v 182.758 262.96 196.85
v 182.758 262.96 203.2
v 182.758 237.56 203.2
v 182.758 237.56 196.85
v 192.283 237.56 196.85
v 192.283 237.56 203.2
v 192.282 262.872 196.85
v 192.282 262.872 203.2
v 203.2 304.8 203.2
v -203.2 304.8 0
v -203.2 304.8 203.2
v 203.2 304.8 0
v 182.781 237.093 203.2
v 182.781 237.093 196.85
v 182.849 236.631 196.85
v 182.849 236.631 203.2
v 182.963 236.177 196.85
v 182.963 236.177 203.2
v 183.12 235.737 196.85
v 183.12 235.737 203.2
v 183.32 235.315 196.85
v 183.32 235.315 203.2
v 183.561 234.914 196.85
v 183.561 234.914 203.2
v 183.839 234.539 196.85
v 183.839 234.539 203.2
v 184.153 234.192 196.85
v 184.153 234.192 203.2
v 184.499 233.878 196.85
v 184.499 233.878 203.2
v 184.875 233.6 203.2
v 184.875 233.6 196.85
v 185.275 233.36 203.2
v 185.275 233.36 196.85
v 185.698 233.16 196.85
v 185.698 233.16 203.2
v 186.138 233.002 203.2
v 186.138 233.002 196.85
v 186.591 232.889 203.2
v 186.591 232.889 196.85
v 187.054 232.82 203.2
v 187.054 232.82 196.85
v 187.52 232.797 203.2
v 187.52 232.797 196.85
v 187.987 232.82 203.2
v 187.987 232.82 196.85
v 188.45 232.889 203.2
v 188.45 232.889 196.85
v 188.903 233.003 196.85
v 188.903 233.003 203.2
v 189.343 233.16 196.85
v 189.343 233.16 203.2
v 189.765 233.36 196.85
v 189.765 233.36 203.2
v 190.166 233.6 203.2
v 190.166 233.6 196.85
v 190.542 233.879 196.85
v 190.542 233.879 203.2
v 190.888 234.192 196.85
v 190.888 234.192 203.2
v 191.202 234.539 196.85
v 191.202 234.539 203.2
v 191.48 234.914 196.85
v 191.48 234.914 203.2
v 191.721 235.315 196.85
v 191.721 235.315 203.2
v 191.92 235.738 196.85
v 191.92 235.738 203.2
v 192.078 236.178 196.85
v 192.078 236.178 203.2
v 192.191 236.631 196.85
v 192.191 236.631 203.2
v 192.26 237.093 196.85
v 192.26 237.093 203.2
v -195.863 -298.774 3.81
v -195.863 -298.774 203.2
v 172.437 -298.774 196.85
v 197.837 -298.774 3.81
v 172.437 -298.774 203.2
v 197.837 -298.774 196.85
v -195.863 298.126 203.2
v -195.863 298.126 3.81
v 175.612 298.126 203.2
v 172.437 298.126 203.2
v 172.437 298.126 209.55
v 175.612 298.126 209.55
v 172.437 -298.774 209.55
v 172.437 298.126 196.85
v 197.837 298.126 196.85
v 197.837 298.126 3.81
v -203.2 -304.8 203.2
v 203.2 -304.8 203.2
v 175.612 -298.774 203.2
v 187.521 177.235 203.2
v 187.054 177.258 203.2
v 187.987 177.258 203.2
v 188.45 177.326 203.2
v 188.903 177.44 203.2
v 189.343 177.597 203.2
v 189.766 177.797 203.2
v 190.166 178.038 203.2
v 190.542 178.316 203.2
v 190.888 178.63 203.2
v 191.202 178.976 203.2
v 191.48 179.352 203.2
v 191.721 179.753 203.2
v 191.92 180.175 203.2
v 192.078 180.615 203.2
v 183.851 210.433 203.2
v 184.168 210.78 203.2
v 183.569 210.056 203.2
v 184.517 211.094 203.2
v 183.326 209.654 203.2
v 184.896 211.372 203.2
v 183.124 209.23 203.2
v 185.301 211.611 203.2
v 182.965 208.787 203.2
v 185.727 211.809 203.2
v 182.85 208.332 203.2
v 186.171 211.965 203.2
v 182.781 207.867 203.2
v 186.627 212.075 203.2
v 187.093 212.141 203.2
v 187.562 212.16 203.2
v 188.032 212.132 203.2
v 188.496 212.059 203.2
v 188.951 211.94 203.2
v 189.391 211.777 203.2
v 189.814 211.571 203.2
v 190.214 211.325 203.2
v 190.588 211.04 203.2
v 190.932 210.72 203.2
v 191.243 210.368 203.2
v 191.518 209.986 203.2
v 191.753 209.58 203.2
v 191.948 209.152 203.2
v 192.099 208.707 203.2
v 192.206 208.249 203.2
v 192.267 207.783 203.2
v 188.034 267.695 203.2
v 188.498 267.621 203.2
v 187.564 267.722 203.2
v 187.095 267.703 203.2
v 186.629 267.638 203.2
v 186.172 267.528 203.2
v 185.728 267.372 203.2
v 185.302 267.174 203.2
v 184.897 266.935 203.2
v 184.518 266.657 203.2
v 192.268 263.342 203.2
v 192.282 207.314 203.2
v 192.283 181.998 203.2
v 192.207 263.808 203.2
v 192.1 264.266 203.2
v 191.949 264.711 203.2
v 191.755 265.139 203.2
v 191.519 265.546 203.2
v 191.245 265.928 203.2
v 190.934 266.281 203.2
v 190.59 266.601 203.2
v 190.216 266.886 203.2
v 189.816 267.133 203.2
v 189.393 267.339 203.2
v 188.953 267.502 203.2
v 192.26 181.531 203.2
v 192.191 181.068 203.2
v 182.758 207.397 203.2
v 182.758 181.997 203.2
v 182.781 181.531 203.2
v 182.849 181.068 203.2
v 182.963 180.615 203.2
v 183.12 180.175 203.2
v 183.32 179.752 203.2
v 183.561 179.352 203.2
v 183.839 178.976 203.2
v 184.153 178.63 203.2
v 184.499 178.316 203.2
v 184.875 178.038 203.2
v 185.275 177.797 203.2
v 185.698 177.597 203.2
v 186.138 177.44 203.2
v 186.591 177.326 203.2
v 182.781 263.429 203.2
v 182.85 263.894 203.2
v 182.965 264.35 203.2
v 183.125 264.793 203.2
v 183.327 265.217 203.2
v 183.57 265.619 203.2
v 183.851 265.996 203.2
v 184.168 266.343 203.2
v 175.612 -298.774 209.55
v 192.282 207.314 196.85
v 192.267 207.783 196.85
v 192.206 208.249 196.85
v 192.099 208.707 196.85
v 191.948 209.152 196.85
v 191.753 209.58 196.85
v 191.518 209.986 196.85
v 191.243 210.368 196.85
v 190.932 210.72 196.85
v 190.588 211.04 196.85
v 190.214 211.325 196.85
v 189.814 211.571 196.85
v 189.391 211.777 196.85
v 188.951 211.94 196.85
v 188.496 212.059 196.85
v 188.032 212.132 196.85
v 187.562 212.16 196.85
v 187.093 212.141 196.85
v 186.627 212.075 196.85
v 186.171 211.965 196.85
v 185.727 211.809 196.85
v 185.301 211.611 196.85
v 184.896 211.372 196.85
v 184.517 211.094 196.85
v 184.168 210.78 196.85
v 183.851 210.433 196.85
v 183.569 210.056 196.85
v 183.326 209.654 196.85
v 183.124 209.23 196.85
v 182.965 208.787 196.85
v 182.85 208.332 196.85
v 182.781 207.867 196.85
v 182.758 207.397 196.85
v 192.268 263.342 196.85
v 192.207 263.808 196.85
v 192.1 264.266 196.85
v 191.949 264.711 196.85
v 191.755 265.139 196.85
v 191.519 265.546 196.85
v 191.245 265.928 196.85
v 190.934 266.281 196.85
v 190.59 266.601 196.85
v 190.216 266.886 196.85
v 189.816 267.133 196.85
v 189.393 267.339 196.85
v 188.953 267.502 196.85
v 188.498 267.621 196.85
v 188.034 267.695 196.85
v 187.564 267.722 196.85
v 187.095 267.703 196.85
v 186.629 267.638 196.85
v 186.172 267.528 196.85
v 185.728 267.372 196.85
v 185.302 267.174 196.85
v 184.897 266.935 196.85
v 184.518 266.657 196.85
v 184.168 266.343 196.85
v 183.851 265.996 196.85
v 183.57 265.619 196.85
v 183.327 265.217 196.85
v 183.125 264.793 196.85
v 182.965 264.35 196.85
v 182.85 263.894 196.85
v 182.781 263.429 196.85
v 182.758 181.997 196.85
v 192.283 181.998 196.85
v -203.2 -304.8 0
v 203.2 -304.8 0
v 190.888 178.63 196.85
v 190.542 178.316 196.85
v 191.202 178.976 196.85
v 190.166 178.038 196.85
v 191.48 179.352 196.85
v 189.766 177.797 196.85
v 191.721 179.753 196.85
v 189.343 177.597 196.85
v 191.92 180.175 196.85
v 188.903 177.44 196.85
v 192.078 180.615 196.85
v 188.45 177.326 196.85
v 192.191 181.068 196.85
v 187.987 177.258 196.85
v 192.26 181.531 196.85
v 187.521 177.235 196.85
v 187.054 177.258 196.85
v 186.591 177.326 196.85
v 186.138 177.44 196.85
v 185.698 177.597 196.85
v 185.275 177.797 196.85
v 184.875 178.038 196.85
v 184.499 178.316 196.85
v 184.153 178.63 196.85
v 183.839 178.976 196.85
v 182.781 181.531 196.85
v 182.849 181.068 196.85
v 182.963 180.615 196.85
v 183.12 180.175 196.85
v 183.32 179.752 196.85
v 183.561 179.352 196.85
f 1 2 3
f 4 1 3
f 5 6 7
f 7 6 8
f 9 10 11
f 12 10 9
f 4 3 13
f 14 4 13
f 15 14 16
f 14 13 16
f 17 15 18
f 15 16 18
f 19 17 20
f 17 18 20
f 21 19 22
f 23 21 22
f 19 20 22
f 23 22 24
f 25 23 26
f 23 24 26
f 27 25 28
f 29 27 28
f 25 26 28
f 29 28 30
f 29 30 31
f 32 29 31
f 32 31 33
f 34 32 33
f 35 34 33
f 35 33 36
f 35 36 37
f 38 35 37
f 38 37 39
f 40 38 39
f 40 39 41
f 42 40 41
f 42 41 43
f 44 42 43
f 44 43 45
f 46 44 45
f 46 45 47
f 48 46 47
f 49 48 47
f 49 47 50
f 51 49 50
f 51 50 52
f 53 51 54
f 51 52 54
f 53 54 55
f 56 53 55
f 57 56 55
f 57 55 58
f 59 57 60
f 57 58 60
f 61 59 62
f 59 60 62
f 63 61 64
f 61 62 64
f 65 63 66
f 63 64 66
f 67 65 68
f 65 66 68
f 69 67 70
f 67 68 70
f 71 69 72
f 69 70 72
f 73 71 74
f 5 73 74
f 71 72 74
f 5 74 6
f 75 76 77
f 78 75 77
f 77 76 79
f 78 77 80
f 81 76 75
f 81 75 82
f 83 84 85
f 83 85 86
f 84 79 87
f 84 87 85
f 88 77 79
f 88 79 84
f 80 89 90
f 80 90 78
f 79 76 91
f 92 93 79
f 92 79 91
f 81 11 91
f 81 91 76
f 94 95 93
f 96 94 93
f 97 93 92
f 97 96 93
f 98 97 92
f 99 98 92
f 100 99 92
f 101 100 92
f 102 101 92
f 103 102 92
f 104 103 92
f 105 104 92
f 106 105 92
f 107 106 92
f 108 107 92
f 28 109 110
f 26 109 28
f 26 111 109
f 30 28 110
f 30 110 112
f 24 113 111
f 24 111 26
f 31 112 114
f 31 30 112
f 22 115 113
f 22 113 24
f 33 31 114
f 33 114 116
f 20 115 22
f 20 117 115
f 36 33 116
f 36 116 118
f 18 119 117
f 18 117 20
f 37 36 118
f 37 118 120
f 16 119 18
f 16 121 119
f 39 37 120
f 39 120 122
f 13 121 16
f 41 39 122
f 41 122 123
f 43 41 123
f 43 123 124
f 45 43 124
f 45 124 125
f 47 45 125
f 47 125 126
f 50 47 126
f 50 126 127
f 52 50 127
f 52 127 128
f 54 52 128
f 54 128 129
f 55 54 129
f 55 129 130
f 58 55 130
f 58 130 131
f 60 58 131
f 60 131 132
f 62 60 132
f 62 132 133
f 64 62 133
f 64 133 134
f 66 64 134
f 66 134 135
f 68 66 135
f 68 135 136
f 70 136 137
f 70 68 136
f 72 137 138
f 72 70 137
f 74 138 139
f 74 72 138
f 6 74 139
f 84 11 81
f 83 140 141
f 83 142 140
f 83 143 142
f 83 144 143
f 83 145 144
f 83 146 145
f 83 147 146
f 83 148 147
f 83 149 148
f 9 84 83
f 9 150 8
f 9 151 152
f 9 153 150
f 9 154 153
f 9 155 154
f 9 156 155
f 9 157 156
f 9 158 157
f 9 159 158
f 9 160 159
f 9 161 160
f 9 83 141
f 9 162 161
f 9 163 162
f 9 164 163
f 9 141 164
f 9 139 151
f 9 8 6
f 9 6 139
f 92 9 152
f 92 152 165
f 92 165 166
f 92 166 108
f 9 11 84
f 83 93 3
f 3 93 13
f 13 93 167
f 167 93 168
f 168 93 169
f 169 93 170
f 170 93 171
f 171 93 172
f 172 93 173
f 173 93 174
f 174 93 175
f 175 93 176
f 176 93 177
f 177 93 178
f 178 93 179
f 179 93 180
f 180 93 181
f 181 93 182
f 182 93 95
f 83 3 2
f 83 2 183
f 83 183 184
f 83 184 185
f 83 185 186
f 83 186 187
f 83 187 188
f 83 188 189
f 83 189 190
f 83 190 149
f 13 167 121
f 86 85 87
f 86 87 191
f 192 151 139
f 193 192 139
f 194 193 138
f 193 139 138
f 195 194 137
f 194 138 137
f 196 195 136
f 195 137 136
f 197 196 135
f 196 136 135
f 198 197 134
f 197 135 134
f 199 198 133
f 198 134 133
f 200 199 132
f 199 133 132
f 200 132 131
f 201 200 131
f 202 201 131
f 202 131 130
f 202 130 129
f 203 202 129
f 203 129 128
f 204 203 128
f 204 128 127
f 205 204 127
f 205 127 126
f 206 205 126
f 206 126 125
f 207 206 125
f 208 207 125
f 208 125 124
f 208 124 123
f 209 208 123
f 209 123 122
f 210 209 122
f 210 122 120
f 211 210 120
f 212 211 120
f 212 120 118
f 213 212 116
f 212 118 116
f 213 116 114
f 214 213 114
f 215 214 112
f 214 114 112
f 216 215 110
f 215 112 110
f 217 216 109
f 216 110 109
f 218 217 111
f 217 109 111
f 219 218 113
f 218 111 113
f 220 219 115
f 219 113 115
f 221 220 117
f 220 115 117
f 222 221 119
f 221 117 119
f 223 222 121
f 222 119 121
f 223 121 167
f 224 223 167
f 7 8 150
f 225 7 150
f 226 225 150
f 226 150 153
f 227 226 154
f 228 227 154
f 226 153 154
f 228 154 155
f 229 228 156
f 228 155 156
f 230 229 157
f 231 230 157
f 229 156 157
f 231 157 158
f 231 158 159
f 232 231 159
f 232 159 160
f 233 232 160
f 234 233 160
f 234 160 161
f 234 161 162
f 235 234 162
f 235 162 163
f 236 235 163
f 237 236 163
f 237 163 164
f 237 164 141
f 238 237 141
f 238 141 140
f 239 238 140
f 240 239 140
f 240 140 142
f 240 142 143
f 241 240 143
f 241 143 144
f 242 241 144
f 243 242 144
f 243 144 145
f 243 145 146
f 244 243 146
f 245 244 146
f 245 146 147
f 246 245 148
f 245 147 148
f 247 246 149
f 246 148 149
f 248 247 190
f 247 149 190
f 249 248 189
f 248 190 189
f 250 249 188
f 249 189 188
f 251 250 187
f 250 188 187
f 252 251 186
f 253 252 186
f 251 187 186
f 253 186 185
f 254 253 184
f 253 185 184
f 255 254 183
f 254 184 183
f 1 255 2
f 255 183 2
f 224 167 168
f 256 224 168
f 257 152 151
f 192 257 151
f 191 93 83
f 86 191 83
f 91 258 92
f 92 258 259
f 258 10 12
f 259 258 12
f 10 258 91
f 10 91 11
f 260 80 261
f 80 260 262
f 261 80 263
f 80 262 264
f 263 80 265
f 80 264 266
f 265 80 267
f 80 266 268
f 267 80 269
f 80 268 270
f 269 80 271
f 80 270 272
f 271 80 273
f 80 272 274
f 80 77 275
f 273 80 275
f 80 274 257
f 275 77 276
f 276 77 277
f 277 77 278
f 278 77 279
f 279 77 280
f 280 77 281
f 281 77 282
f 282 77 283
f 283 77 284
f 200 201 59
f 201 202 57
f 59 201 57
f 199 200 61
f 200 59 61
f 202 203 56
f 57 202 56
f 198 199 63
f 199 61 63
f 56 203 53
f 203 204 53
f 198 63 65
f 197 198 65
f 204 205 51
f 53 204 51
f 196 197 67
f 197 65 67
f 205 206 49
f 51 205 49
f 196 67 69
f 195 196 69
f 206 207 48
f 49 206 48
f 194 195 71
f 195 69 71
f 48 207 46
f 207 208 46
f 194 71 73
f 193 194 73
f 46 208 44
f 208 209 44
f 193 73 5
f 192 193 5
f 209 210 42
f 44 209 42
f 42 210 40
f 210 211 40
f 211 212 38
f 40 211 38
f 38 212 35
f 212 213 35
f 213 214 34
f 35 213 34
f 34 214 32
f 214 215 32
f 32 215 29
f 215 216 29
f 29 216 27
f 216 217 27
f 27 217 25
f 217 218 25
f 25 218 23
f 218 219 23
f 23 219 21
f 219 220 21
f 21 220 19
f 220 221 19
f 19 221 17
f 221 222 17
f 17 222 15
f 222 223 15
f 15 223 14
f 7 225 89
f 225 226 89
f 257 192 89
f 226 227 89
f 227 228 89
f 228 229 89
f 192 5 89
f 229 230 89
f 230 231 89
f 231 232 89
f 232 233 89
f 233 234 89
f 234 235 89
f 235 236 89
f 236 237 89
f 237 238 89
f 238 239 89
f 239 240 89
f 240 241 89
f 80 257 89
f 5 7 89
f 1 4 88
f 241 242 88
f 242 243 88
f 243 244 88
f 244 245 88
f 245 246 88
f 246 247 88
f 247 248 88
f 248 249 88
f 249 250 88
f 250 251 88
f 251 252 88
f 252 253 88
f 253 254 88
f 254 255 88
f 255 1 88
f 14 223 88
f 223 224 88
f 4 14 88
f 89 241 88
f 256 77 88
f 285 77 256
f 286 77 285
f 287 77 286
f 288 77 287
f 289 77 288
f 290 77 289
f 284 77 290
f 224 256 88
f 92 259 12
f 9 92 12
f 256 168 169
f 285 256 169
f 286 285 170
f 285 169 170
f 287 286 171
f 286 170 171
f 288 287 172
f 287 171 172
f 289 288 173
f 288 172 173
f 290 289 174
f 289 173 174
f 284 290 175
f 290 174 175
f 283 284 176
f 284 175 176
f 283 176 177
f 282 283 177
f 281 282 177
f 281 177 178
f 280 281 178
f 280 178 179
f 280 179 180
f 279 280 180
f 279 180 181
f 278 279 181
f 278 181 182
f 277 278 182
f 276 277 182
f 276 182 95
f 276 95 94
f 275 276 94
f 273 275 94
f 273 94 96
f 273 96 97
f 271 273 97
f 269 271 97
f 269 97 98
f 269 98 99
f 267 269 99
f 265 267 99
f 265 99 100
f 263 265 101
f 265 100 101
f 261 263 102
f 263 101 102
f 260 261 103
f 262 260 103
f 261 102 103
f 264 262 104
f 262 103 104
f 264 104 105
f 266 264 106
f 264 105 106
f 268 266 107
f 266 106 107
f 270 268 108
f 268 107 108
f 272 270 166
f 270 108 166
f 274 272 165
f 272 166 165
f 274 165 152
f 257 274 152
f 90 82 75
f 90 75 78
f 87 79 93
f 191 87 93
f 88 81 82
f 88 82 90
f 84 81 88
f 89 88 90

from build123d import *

# Parameters (mm, degrees)
F0_W     = 406.4
F0_H     = 609.6
F1_DEPTH = 203.2
F2_W     = 368.3
F2_H     = 596.9
F3_DEPTH = 199.39
F5_DEPTH = 25.4
F7_DEPTH = 25.4
F8_W     = 3.175
F8_H     = 596.9
F9_DEPTH = 6.35


with BuildPart() as f1:
    # F0 (on Top) → F1 (new body)
    with BuildSketch(Plane.XY):
        Rectangle(F0_W, F0_H)
    extrude(amount=F1_DEPTH)

    # F2 (on face) → F3 (cut)
    with BuildSketch(Plane.XY.offset(203.2)):
        with Locations((-11.712919, -0.323749)):
            Rectangle(F2_W, F2_H)
    extrude(amount=-F3_DEPTH, mode=Mode.SUBTRACT)

    # F4 (on face) → F5 (cut)
    with BuildSketch(Plane(origin=(172.437081, 0, 0), x_dir=(0, -1, 0), z_dir=(-1, 0, 0))):
        Polygon((-298.126251, 196.85), (-298.126251, 3.81), (298.773749, 3.81), (298.773749, 196.85), (-77.169992, 196.85), align=None)
    extrude(amount=-F5_DEPTH, mode=Mode.SUBTRACT)

    # F6 (on face) → F7 (cut)
    with BuildSketch(Plane.XY.offset(203.2)):
        with BuildLine():
            Line((192.28287, 237.560081), (192.282062, 262.872214))
            ThreePointArc((192.282062, 262.872214), (187.564229, 267.722228), (182.75787, 262.959929))
            Line((182.75787, 262.959929), (182.75787, 237.559929))
            ThreePointArc((182.75787, 237.559929), (187.520446, 232.797429), (192.28287, 237.560081))
        make_face()
        with BuildLine():
            Line((192.282946, 181.997568), (192.282208, 207.31357))
            ThreePointArc((192.282208, 207.31357), (187.562377, 212.159745), (182.757946, 207.397429))
            Line((182.757946, 207.397429), (182.757946, 181.997429))
            ThreePointArc((182.757946, 181.997429), (187.520515, 177.234929), (192.282946, 181.997568))
        make_face()
    extrude(amount=-F7_DEPTH, mode=Mode.SUBTRACT)

    # F8 (on face) → F9 (join)
    with BuildSketch(Plane.XY.offset(203.2)):
        with Locations((174.024581, -0.323749)):
            Rectangle(F8_W, F8_H)
    extrude(amount=F9_DEPTH)


solid = f1.part
